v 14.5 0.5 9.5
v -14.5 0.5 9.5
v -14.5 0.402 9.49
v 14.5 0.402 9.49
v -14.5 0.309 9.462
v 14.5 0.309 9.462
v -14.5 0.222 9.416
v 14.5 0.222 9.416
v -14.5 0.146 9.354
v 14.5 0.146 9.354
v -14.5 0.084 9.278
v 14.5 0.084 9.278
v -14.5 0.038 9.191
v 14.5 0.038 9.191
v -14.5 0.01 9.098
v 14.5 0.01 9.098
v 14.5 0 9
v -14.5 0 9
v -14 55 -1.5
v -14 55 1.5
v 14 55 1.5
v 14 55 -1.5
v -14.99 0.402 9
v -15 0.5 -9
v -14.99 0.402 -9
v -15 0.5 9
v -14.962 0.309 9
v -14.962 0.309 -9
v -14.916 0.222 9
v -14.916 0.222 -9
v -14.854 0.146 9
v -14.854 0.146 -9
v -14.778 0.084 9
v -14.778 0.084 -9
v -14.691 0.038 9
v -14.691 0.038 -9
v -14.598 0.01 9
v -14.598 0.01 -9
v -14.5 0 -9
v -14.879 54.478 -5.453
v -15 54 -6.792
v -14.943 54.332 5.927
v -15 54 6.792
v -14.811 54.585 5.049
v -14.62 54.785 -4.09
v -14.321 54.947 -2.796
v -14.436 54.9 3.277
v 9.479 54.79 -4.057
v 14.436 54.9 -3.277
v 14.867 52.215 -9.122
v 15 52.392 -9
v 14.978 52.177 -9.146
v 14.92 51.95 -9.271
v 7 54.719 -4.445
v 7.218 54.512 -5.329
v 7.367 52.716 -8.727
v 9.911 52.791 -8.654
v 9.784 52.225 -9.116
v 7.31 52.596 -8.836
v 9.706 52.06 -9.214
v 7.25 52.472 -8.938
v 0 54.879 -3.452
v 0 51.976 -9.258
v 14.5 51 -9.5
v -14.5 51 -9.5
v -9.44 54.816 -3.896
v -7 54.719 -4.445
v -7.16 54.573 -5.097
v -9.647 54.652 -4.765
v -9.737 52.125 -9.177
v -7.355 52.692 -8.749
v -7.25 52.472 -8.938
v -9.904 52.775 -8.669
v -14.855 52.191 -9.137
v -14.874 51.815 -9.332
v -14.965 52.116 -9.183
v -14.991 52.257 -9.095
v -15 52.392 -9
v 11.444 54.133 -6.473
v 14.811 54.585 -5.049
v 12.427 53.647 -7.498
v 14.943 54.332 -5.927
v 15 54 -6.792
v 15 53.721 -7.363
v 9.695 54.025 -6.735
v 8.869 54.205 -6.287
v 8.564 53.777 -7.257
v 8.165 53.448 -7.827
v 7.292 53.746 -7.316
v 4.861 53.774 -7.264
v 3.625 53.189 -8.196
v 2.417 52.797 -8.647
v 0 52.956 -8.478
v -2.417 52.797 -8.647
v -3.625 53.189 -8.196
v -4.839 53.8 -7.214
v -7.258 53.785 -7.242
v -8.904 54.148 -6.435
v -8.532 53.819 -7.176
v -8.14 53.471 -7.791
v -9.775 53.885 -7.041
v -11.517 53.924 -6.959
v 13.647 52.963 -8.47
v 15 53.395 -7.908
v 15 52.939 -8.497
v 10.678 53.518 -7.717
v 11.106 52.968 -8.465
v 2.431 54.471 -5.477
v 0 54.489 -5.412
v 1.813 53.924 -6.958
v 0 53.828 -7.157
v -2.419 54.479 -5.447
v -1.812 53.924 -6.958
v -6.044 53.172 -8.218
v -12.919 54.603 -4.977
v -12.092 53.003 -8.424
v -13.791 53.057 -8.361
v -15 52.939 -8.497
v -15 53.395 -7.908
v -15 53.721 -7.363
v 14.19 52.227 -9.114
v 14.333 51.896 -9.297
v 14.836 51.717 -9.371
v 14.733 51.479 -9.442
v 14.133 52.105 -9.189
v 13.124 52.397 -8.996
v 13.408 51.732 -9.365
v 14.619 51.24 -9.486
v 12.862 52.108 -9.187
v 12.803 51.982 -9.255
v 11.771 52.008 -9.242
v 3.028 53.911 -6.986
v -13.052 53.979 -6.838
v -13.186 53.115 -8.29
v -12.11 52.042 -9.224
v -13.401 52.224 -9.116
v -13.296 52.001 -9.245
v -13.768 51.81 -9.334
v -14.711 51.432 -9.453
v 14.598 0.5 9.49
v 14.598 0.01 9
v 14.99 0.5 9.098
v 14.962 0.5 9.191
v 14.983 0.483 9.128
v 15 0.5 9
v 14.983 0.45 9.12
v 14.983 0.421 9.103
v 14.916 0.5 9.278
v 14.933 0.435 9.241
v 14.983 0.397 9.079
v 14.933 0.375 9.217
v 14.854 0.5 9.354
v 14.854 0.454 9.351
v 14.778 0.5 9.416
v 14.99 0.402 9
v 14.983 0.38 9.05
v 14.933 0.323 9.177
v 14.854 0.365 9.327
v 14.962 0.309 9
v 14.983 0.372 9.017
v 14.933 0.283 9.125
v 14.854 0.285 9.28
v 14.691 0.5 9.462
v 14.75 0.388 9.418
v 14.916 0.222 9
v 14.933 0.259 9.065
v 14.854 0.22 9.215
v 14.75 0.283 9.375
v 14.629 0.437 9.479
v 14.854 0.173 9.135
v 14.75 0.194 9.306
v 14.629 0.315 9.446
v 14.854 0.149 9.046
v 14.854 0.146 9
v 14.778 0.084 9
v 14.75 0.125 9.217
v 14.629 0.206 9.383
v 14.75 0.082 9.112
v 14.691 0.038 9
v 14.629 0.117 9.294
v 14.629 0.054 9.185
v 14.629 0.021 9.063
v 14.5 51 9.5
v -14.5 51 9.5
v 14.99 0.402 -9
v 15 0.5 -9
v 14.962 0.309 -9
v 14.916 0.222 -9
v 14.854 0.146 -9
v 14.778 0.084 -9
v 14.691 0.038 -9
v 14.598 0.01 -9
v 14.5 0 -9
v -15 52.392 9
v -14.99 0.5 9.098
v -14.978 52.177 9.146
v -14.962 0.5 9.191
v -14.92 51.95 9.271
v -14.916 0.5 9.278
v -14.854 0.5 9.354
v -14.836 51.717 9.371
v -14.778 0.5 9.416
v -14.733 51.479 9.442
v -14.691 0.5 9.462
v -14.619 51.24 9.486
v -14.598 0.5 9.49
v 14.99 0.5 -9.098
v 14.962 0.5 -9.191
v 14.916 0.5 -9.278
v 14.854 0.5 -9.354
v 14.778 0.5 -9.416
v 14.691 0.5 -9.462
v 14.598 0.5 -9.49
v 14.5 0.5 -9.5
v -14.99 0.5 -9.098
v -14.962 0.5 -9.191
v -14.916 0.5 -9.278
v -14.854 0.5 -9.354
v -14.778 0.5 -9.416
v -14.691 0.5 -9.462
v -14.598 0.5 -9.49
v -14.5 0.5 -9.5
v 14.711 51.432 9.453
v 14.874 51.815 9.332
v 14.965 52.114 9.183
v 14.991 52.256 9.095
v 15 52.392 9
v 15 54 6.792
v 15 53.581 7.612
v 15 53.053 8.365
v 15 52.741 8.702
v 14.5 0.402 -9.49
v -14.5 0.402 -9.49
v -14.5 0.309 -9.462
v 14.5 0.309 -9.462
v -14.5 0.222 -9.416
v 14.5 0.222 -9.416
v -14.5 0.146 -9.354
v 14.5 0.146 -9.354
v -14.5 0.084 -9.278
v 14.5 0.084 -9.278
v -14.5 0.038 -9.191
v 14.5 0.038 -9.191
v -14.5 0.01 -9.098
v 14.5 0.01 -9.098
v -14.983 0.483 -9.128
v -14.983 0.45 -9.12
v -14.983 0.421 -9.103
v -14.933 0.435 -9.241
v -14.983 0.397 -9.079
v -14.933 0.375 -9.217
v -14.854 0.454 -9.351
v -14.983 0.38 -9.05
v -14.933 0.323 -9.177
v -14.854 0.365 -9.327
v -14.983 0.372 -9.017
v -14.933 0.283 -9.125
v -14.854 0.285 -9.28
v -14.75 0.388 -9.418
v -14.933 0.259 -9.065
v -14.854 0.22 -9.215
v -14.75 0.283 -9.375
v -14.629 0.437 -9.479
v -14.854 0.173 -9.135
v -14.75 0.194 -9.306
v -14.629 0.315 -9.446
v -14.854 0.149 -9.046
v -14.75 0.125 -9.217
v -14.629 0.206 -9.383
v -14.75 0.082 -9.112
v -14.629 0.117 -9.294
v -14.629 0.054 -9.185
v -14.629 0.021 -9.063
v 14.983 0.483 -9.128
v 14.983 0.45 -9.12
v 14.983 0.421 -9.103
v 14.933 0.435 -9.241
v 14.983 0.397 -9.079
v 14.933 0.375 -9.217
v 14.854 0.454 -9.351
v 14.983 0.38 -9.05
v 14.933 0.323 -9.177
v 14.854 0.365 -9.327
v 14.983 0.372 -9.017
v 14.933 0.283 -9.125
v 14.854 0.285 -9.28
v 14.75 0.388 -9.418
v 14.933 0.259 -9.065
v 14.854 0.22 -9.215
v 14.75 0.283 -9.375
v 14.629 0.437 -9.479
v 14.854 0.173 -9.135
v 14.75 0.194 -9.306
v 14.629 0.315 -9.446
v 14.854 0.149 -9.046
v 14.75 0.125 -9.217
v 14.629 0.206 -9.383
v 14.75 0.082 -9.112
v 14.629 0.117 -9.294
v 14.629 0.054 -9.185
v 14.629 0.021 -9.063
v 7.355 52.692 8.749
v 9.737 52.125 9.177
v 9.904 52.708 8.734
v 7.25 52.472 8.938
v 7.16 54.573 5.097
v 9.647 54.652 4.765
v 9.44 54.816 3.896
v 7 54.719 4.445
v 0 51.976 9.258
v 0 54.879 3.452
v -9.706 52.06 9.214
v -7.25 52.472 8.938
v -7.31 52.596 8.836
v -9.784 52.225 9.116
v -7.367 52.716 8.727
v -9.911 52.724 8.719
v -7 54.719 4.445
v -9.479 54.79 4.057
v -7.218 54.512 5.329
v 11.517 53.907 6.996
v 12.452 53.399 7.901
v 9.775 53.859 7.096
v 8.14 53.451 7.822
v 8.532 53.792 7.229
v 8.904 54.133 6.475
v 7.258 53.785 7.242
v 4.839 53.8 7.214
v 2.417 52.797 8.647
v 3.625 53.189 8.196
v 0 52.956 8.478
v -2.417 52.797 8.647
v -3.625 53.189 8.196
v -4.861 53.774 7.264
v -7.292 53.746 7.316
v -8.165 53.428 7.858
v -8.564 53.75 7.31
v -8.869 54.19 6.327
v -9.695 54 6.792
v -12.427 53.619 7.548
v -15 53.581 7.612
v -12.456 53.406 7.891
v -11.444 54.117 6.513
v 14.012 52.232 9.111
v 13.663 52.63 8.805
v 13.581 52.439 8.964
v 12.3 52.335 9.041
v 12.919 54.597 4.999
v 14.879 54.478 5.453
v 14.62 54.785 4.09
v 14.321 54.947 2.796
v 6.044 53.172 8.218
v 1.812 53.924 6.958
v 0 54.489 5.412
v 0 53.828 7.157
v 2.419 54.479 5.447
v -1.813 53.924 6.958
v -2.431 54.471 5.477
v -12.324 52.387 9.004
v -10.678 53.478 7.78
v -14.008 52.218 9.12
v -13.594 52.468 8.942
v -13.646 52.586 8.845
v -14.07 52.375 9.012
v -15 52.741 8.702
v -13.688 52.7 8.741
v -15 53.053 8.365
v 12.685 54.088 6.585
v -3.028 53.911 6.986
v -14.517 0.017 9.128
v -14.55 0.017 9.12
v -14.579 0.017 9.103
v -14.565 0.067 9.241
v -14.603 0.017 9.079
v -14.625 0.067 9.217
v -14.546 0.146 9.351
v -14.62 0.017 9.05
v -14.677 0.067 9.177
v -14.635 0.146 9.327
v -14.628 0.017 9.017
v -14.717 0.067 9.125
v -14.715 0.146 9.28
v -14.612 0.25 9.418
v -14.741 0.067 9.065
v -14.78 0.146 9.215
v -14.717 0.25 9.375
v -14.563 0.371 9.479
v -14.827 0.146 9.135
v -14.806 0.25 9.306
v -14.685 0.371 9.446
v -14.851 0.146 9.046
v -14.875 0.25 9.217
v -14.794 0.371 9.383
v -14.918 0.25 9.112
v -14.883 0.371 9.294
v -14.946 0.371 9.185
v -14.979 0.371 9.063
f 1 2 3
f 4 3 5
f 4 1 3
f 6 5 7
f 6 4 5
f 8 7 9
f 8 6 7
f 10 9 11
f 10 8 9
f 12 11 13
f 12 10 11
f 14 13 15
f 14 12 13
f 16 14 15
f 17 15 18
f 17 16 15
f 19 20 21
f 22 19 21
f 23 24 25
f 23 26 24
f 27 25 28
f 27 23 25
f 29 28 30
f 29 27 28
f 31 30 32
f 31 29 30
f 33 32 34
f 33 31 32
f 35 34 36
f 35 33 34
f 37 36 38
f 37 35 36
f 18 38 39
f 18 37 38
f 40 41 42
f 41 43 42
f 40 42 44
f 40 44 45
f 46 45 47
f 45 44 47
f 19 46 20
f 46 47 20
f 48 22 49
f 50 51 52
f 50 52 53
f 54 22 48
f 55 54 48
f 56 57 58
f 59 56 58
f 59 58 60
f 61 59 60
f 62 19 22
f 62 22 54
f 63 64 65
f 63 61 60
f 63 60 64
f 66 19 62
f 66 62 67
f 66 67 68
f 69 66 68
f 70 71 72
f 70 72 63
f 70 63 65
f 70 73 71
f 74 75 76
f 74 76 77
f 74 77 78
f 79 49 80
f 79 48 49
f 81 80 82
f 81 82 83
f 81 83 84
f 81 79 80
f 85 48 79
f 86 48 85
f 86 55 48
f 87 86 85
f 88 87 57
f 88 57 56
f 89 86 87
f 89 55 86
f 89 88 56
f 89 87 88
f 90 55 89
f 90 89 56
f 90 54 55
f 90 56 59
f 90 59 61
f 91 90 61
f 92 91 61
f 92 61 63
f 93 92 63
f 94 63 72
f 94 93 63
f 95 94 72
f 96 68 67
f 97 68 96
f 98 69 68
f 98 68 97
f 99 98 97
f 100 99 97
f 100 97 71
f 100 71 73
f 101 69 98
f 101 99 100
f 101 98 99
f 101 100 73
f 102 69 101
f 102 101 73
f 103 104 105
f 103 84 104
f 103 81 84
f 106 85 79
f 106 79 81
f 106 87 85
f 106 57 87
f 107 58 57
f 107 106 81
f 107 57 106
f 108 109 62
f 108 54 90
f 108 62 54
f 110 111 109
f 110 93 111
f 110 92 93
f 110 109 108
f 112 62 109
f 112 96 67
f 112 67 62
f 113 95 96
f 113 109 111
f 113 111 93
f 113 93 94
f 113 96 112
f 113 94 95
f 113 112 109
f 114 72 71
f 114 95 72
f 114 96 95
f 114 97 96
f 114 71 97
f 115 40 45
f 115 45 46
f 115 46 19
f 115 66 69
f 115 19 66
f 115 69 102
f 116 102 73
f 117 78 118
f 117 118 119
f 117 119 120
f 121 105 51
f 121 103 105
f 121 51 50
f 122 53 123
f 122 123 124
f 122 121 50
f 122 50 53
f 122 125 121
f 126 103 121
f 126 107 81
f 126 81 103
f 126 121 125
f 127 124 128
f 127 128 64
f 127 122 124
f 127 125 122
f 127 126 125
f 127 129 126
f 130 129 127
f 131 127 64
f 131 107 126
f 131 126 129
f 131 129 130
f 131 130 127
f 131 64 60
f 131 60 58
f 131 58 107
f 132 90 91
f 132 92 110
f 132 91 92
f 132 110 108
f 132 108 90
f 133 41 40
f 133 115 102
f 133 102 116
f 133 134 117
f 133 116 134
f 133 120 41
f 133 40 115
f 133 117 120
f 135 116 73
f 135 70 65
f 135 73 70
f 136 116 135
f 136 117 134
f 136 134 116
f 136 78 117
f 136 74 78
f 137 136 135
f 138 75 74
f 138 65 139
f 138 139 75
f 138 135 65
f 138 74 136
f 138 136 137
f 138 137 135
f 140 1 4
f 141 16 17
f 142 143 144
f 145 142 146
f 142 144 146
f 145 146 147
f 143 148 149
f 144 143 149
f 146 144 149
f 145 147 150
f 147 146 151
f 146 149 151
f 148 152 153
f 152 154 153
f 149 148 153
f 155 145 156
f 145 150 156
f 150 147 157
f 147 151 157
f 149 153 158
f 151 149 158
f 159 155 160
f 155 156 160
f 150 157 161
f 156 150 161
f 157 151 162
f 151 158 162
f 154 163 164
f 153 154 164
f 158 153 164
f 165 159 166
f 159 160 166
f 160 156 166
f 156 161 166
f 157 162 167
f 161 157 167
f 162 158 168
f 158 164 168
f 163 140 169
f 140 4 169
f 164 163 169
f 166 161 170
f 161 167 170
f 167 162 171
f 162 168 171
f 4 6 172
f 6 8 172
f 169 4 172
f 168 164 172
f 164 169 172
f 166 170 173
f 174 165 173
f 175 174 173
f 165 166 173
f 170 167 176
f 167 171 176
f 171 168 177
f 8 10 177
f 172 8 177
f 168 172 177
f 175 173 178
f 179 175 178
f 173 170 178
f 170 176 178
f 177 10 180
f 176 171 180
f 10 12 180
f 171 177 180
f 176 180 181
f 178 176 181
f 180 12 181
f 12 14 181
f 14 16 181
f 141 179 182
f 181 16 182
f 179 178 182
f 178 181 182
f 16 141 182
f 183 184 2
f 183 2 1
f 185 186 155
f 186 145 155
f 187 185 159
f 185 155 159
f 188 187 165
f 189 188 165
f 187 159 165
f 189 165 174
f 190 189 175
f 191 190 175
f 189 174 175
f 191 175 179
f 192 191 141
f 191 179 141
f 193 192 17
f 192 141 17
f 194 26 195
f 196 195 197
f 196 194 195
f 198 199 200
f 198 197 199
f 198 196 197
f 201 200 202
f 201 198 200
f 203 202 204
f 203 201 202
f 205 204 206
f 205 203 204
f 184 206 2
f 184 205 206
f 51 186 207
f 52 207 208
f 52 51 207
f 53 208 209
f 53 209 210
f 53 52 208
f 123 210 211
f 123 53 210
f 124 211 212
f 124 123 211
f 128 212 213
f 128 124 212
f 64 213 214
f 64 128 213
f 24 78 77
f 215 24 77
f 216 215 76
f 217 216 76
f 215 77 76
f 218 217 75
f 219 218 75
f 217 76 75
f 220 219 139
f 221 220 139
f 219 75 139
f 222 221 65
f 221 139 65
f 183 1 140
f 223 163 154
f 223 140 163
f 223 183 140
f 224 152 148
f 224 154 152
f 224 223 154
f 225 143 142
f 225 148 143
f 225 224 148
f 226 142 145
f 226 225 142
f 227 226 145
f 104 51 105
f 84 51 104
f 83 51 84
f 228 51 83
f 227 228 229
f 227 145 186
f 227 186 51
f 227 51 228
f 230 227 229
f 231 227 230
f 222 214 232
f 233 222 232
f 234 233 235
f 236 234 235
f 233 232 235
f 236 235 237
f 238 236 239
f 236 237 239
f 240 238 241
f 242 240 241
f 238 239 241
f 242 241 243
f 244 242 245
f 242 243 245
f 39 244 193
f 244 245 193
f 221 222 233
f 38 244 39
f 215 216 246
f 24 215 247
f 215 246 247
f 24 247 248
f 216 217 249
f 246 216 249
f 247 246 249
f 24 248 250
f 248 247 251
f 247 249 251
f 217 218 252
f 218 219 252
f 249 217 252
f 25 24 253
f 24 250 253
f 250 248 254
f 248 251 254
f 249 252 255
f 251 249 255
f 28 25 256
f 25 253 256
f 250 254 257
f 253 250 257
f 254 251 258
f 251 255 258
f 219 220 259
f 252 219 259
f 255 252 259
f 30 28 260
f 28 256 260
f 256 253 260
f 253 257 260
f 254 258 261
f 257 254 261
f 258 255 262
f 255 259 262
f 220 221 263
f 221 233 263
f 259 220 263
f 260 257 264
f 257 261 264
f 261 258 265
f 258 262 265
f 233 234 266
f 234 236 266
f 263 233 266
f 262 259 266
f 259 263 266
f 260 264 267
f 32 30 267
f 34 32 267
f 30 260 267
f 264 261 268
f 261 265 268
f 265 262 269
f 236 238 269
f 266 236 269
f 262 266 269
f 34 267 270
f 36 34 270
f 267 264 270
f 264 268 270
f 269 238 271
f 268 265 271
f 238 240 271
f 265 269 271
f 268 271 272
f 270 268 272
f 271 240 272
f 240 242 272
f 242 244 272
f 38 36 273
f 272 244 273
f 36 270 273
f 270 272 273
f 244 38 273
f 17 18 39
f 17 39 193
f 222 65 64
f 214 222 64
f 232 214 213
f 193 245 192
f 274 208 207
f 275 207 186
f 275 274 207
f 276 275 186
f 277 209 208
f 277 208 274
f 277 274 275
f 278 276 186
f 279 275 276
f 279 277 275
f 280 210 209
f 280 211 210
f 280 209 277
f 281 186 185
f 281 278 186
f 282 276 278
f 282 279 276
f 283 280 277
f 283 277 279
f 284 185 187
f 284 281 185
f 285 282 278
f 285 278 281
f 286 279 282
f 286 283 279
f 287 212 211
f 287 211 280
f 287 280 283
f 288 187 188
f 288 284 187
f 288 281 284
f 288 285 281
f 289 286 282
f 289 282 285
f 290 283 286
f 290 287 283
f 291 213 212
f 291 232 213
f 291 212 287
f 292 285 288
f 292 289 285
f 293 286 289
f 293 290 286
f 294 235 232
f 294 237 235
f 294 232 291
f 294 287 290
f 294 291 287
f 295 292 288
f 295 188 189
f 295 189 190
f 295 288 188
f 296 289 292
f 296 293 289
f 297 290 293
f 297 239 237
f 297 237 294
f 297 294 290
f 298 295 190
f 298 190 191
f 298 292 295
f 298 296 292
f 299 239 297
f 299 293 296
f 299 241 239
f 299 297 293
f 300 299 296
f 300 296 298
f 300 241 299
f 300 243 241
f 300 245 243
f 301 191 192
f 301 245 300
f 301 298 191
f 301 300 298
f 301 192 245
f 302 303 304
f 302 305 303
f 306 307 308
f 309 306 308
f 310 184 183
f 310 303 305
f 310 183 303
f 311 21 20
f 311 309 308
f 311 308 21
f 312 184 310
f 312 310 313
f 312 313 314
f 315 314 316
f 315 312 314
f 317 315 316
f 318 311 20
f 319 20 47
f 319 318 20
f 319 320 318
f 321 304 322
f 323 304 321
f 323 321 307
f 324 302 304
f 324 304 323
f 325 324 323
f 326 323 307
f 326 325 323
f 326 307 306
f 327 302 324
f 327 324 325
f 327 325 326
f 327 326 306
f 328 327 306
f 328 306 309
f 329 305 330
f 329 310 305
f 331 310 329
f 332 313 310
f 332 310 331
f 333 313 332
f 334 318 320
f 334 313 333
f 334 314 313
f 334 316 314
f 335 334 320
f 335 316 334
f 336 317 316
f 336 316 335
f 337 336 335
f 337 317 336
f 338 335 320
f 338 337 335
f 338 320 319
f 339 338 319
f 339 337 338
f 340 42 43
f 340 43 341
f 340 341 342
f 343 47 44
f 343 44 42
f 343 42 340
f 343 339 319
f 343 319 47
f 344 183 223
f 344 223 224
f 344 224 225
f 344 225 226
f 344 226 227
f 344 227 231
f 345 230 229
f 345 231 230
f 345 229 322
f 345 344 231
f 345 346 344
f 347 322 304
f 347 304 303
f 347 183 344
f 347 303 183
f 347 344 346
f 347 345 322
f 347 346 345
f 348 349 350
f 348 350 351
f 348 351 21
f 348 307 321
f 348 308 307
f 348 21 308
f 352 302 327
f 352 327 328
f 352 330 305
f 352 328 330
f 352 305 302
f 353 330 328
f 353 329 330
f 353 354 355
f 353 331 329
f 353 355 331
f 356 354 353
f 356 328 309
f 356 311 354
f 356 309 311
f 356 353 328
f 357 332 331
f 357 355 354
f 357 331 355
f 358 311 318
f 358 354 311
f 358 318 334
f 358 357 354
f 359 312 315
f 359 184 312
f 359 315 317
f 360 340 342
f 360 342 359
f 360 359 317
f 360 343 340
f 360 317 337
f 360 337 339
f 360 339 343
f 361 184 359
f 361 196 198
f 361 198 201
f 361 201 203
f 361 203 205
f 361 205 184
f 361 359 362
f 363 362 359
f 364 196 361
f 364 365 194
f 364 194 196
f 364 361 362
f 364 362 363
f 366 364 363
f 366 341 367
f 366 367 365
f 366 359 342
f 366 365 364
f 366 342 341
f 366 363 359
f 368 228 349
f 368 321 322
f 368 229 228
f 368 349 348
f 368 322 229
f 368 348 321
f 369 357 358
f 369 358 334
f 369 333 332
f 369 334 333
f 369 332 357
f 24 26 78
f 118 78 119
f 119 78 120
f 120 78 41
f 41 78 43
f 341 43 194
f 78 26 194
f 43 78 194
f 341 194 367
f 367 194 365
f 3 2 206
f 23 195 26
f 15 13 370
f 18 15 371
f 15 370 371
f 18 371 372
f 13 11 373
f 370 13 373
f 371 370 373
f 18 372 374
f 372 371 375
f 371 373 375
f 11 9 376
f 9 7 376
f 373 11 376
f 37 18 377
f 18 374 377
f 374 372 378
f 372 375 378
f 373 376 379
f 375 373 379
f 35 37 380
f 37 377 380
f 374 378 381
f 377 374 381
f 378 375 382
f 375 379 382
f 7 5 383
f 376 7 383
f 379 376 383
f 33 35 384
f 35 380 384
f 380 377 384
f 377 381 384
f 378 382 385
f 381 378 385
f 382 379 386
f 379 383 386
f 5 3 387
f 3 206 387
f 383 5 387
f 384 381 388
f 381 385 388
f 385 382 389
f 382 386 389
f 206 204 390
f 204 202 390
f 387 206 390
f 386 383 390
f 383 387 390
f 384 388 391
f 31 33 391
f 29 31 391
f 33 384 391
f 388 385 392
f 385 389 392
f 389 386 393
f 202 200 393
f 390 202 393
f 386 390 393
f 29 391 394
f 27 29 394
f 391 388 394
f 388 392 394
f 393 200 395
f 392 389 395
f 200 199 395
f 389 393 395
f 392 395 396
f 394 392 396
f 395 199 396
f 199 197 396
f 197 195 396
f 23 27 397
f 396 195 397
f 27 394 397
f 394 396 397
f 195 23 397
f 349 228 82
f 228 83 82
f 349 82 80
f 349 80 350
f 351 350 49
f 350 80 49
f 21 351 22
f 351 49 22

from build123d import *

# Parameters (mm, degrees)
SKETCH1_W           = 30
SKETCH1_H           = 55
BOSS_EXTRUDE1_DEPTH = 9.5
FILLET1_R           = 0.5
FILLET2_SIZE        = 4
FILLET2_SIZE_2      = 8
FILLET3_START       = -16
FILLET3_DEPTH       = 32
FILLET4_R           = 1


with BuildPart() as part:
    # Sketch1 → Boss-Extrude1 (new, symmetric)
    with BuildSketch(Plane.XY):
        with Locations((0, 27.5)):
            Rectangle(SKETCH1_W, SKETCH1_H)
    extrude(amount=BOSS_EXTRUDE1_DEPTH, both=True)

    # Fillet1
    fillet1_edges = [part.edges().sort_by_distance(p)[0] for p in [
        (-15, 27.5, 9.5),
        (0, 0, 9.5),
        (15, 27.5, 9.5),
        (0, 0, -9.5),
        (-15, 27.5, -9.5),
        (15, 27.5, -9.5),
        (15, 0, 0),
        (-15, 0, 0),
    ]]
    fillet(fillet1_edges, radius=FILLET1_R)

    # Fillet2
    # a fillet whose section is not a circle: 8, 4 mm, written as the material it takes off along each edge
    with BuildSketch(Plane(origin=(-34.5, 55, 9.5), x_dir=(0, -1, 0), z_dir=(1, 0, 0))) as fillet2_piece_1:
        with BuildLine():
            Bezier((FILLET2_SIZE, 0), (0, 0), (0, FILLET2_SIZE_2), weights=[1, 0.707106781, 1])
            Line((0, FILLET2_SIZE_2), (0, 0))
            Line((0, 0), (FILLET2_SIZE, 0))
        make_face()
    extrude(amount=69, mode=Mode.SUBTRACT)

    # Fillet3: read off the stored shape, not the designer's step
    # Fillet3 outline → Fillet3 (cut)
    with BuildSketch(Plane.YZ.offset(FILLET3_START)):
        with BuildLine():
            Line((55, -9.5), (55, -1.5))
            add(Edge.make_bspline(
                [(55, -1.5), (55, -9.5), (51, -9.5)],
                knots=[0, 0, 0, 1, 1, 1], degree=2, weights=[1, 0.707106781, 1]))
            Line((51, -9.5), (55, -9.5))
        make_face()
    extrude(amount=FILLET3_DEPTH, mode=Mode.SUBTRACT)

    # Fillet4
    # the kernel refuses this fillet: 1 mm, written as the material it takes off along each edge
    with BuildSketch(Plane(origin=(-15, 55, 9), x_dir=(0, -1, 0), z_dir=(0, 0, -1)), Plane(origin=(15, 55, -9), x_dir=(0, -1, 0), z_dir=(0, 0, 1))) as fillet4_piece_1:
        with BuildLine():
            CenterArc((FILLET4_R, -FILLET4_R), FILLET4_R, 90, 90)
            Line((0, -FILLET4_R), (0, 0))
            Line((0, 0), (FILLET4_R, 0))
        make_face()
    extrude(amount=18, mode=Mode.SUBTRACT)


solid = part.part
